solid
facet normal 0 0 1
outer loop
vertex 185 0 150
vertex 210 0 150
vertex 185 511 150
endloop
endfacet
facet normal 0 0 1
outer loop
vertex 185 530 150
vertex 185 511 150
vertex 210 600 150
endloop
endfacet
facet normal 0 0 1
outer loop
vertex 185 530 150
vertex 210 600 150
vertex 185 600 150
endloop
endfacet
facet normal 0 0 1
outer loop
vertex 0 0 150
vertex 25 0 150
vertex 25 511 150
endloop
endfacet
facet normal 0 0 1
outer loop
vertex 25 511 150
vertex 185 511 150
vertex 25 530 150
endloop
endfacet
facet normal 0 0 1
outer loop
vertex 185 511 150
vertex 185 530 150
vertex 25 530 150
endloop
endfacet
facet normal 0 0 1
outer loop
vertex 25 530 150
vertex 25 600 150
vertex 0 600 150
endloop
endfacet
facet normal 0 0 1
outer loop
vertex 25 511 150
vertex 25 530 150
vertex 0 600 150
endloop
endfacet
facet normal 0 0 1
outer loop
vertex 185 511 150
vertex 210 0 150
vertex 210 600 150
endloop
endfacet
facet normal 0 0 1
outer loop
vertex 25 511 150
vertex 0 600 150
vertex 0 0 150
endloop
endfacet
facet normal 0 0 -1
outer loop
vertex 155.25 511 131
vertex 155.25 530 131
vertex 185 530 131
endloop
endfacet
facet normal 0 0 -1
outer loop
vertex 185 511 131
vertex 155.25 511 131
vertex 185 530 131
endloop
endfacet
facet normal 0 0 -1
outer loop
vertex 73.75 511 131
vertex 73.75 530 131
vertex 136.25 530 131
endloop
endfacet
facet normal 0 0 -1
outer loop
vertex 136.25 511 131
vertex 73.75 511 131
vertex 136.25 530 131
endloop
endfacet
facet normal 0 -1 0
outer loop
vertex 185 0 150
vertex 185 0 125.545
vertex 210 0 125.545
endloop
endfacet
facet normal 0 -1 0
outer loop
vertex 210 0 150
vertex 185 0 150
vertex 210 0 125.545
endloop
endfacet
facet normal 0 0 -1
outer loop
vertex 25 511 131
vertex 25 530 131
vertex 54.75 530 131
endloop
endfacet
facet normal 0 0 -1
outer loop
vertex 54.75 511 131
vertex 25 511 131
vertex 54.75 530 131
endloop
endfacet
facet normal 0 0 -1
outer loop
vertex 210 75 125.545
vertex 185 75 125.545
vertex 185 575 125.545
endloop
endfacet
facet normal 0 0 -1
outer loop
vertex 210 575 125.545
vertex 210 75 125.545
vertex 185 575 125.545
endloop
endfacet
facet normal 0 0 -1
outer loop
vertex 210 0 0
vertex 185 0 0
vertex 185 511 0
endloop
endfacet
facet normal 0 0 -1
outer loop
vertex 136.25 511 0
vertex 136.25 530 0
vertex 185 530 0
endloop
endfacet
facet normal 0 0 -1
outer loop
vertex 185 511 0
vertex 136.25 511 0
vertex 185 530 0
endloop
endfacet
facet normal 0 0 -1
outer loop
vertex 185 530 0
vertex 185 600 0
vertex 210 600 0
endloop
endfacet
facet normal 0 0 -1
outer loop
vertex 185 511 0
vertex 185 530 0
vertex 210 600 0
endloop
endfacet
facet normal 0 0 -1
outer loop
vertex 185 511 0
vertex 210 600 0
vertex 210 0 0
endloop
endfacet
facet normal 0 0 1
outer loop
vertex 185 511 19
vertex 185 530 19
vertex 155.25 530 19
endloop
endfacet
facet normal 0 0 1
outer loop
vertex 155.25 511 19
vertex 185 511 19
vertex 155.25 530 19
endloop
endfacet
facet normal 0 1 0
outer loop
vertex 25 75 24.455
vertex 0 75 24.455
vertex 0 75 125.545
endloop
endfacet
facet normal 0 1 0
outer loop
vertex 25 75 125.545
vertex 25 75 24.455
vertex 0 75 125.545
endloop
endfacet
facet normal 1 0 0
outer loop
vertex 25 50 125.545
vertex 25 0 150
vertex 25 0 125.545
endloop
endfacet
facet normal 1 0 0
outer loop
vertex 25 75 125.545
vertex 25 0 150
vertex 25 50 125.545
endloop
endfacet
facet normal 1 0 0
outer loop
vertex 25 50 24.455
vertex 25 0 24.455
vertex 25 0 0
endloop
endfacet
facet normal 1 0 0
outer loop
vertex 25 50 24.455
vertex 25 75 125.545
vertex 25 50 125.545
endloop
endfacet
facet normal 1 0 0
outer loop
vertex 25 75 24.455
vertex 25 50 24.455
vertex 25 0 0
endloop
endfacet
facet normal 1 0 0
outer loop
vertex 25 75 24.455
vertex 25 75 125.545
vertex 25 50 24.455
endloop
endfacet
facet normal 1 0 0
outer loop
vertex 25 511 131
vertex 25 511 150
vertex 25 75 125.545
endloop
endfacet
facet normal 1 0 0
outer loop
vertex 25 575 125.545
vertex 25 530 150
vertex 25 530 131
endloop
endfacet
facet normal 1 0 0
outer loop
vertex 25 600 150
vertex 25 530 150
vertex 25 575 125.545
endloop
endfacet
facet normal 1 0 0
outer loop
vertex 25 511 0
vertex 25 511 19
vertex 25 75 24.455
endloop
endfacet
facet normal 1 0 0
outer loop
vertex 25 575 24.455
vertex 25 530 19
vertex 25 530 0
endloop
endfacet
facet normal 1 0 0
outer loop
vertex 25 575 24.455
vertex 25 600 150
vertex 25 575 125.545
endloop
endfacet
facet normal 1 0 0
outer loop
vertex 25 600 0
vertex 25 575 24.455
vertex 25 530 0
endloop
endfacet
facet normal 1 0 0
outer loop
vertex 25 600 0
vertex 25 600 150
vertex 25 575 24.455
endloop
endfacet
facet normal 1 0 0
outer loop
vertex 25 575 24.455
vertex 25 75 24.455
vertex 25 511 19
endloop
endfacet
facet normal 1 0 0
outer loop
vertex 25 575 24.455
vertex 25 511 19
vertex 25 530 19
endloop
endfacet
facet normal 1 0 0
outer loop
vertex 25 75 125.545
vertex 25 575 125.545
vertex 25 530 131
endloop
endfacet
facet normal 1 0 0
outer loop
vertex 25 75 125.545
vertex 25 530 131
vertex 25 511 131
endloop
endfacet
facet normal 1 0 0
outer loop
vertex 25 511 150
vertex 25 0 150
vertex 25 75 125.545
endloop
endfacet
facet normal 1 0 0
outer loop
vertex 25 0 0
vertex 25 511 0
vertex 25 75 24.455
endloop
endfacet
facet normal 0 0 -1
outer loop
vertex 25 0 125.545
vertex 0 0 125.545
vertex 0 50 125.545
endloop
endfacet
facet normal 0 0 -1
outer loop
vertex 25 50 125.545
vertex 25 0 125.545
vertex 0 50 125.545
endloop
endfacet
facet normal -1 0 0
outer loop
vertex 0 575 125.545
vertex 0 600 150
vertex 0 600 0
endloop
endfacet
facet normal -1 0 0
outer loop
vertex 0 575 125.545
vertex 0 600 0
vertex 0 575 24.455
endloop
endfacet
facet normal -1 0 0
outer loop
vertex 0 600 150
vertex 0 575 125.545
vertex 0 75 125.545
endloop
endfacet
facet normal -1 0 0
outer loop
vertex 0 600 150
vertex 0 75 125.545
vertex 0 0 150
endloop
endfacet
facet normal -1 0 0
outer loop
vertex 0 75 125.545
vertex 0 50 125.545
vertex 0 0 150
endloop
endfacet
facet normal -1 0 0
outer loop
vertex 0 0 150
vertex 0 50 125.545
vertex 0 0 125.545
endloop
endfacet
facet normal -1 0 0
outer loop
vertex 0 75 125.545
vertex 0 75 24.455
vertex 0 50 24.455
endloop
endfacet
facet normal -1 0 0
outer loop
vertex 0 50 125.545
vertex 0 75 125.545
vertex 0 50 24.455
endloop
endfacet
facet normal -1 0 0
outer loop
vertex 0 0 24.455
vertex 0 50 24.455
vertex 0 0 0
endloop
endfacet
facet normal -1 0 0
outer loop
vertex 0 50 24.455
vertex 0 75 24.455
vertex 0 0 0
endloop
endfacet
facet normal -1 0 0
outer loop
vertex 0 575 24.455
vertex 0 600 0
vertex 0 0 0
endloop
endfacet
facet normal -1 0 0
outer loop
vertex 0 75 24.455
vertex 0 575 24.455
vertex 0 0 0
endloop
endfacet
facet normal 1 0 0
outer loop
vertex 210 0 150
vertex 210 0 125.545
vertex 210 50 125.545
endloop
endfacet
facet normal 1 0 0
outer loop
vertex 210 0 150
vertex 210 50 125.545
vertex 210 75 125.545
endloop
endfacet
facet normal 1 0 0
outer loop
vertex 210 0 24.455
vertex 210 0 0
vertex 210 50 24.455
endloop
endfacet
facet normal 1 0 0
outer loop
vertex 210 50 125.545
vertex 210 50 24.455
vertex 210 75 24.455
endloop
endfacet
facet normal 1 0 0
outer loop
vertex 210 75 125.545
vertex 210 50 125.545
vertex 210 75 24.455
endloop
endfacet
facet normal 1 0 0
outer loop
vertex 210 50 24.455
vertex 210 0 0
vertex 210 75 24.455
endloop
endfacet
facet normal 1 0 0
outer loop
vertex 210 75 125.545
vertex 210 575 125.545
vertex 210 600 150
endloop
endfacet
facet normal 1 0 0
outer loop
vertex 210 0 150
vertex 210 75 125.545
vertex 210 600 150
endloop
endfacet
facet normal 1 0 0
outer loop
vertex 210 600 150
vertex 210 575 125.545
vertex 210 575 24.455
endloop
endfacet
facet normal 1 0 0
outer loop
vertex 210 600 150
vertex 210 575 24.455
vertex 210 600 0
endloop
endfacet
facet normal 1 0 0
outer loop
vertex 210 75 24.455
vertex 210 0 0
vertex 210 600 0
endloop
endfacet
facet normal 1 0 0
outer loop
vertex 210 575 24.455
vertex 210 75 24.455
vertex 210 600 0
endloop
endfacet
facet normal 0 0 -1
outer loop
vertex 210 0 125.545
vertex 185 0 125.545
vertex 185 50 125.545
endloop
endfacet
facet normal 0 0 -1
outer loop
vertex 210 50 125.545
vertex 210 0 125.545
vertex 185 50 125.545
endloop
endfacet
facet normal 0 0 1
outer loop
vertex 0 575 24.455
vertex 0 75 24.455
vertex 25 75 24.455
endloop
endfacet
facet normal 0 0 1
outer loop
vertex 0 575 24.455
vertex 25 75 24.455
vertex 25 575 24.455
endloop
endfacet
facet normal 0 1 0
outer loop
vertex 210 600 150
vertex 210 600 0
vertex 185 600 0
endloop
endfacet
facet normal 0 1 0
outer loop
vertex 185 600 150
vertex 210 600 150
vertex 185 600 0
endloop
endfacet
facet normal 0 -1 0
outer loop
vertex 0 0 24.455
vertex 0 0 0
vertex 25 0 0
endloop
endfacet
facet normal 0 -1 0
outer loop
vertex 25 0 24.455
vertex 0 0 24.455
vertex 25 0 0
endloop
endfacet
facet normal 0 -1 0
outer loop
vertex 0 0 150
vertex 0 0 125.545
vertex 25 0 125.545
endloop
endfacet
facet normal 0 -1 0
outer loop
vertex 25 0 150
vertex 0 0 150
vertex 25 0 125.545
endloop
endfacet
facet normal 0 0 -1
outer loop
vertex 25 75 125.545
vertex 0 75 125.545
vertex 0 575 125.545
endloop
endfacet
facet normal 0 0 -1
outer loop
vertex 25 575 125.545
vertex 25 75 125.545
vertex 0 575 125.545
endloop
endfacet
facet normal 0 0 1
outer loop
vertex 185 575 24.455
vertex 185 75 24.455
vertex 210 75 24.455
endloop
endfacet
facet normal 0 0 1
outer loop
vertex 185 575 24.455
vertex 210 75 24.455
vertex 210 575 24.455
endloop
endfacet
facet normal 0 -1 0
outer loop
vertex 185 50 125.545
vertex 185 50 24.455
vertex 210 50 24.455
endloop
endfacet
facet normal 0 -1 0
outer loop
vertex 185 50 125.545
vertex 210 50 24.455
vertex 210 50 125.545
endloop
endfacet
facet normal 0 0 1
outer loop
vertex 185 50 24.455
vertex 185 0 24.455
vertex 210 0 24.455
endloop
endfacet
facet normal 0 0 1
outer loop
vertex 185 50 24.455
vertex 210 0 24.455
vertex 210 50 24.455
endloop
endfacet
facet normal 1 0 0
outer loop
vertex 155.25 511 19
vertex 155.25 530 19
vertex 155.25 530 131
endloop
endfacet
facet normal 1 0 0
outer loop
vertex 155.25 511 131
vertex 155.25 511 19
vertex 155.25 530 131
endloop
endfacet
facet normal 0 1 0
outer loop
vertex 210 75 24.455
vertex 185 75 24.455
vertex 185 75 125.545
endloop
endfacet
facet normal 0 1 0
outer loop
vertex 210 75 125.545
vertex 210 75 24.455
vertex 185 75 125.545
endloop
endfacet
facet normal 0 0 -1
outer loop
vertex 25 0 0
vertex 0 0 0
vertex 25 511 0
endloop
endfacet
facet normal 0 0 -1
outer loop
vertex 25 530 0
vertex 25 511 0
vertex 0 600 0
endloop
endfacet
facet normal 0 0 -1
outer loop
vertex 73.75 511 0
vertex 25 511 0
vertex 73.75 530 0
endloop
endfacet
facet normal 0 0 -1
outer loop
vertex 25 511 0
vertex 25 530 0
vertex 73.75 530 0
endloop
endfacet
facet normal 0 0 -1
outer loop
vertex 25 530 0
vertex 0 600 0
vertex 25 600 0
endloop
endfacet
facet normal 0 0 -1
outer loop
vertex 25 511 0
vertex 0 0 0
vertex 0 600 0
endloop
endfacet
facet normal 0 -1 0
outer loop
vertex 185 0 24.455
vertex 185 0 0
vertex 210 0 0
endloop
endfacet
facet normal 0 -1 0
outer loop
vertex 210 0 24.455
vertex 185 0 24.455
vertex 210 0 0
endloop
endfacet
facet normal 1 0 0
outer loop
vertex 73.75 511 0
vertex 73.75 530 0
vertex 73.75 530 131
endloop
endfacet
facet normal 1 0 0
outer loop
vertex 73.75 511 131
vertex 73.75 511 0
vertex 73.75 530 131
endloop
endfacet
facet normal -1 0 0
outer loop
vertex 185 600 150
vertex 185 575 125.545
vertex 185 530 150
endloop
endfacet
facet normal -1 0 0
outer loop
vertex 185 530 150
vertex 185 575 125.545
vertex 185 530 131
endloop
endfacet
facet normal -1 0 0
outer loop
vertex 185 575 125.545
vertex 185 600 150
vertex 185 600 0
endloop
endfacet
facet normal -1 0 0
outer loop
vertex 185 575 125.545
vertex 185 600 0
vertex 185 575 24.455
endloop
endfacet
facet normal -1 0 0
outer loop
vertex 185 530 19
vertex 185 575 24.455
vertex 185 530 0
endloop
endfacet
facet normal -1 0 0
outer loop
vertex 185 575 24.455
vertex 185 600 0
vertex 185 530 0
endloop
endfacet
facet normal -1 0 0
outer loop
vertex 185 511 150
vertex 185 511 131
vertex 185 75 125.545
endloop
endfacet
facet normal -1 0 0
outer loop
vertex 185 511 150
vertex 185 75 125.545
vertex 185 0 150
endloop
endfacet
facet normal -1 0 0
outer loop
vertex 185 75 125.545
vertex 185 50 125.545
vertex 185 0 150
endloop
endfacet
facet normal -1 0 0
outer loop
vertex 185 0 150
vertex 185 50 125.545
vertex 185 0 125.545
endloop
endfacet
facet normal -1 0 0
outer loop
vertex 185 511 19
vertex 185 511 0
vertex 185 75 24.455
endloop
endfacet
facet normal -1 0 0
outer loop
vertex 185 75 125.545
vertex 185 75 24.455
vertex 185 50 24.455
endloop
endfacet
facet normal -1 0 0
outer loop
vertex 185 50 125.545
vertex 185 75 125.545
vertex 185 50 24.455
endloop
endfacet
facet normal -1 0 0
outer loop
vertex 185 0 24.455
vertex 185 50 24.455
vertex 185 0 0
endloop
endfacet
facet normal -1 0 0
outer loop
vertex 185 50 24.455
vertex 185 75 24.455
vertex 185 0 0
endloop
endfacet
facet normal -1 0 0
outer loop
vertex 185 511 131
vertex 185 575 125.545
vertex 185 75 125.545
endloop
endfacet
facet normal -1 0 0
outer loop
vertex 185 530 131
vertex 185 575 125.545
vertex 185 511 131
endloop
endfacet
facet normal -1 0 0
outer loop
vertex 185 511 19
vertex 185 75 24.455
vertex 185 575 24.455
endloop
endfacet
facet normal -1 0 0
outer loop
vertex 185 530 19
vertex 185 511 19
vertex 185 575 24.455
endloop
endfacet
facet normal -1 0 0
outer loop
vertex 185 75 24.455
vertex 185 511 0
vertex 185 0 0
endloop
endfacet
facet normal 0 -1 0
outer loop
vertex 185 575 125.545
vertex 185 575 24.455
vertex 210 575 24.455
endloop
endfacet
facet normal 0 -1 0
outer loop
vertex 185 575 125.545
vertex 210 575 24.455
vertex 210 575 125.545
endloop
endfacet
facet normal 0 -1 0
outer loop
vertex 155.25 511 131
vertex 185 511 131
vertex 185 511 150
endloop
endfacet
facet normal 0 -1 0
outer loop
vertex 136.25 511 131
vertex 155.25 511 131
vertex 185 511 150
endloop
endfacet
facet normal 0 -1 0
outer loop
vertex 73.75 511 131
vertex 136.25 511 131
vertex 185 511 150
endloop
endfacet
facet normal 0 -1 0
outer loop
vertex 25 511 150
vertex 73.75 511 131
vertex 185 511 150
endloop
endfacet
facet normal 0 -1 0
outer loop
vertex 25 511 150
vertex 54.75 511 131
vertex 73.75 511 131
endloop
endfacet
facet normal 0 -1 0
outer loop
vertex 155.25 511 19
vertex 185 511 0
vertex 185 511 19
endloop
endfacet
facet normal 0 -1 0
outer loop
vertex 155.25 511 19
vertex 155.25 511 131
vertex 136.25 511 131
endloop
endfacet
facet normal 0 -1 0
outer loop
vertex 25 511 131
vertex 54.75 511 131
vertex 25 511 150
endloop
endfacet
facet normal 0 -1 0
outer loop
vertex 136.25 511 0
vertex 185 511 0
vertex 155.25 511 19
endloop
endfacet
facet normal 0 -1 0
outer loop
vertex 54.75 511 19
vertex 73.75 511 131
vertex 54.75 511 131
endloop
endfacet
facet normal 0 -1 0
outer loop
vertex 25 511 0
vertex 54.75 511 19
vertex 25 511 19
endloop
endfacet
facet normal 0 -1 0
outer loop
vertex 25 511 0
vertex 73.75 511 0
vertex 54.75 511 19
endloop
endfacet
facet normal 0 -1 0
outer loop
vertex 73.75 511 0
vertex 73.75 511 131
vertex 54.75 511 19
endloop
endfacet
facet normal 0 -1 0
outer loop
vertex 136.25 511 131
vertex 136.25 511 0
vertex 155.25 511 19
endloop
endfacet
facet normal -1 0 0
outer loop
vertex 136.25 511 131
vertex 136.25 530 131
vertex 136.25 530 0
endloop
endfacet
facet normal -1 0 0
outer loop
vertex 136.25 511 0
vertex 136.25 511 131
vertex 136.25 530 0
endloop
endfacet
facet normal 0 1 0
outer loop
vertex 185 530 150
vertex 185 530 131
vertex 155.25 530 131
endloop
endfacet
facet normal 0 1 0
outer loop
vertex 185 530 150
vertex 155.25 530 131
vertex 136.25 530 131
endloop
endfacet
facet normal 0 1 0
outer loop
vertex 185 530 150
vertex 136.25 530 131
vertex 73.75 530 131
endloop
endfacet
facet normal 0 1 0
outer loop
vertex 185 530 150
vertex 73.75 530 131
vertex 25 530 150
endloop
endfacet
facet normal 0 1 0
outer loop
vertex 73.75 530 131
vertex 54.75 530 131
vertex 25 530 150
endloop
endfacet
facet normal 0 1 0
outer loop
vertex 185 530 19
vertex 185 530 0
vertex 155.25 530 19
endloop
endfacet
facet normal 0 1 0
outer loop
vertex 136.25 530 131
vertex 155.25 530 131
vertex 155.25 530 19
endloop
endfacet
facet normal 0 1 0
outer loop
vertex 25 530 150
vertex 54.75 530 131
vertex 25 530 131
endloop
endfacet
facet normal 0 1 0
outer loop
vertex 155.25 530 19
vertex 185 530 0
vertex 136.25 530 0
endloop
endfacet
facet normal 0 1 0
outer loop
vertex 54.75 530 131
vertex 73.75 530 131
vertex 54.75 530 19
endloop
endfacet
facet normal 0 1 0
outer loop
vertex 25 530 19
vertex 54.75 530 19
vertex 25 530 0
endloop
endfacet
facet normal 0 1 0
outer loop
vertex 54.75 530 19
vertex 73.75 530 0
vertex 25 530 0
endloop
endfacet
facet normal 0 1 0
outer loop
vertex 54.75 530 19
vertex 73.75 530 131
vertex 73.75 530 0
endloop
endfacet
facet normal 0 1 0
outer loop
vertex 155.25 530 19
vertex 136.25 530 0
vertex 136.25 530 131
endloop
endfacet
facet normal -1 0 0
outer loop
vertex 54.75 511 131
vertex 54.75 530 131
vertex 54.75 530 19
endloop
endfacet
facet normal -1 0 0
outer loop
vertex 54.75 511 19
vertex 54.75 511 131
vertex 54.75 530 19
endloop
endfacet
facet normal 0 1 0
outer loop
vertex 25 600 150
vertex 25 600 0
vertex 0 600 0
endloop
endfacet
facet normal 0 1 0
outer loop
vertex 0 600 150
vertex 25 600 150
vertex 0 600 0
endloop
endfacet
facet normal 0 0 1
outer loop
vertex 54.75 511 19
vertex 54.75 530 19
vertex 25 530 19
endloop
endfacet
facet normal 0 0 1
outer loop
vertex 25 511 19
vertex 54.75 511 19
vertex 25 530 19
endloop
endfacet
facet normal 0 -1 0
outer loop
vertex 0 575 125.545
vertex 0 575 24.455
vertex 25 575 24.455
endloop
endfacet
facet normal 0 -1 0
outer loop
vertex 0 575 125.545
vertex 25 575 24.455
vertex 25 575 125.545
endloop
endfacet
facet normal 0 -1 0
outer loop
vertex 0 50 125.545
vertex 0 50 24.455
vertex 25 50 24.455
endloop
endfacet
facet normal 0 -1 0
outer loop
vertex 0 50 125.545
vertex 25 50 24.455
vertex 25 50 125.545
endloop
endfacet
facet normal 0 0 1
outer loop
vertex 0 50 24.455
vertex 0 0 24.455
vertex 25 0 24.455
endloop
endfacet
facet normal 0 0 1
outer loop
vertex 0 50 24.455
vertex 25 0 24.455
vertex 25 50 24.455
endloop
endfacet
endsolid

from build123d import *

# Parameters (mm, degrees)
BOSS_EXTRUDE5_DEPTH = 150
SKETCH6_W           = 101.090693468
SKETCH6_H           = 50
SKETCH6_H_2         = 500
CUT_EXTRUDE1_DEPTH  = 654.146231712
CUT_EXTRUDE2_REACH  = 655.146
SKETCH7_W           = 160
SKETCH7_H           = 150
SKETCH8_W           = 48.75
SKETCH8_H           = 19
BOSS_EXTRUDE6_DEPTH = 19
BOSS_EXTRUDE8_DEPTH = 19


with BuildPart() as part:
    # Sketch5 → Boss-Extrude5 (new body)
    with BuildSketch(Plane.XY):
        Polygon((0, 600), (0, 0), (25, 0), (25, 575), (185, 575), (185, 0), (210, 0), (210, 600), align=None)
    extrude(amount=BOSS_EXTRUDE5_DEPTH)

    # Sketch6 → Cut-Extrude1 (cut, through all)
    with BuildSketch(Plane.ZY):
        with Locations((75, 25)):
            Rectangle(SKETCH6_W, SKETCH6_H)
        with Locations((75, 325)):
            Rectangle(SKETCH6_W, SKETCH6_H_2)
    extrude(amount=-CUT_EXTRUDE1_DEPTH, mode=Mode.SUBTRACT)

    # Sketch7 → Cut-Extrude2 (cut, up to next)
    with BuildSketch(Plane(origin=(0, 600, 0), x_dir=(1, 0, 0), z_dir=(0, 1, 0)), mode=Mode.PRIVATE) as cut_extrude2_sk1:
        with Locations((105, -75)):
            Rectangle(SKETCH7_W, SKETCH7_H)
    cut_extrude2_tool1 = extrude(cut_extrude2_sk1.sketch, amount=-CUT_EXTRUDE2_REACH, mode=Mode.PRIVATE) & part.part
    add(cut_extrude2_tool1.solids().sort_by_distance((105, 600, 75))[0], mode=Mode.SUBTRACT)


with BuildPart() as cut_extrude2_piece_1:
    # of the separate pieces the step leaves, piece 1, a body of its own (cut_extrude2_pieces)
    add(part.part.solids().sort_by_distance((0, 600, 0))[0])

    # Sketch8 → Boss-Extrude6 (add)
    with BuildSketch(Plane(origin=(0, 0, 0), x_dir=(-1, 0, 0), z_dir=(0, 0, -1))):
        with Locations((-160.625, 520.5)):
            Rectangle(SKETCH8_W, SKETCH8_H)
        with Locations((-49.375, 520.5)):
            Rectangle(SKETCH8_W, SKETCH8_H)
    extrude(amount=-BOSS_EXTRUDE6_DEPTH)


with BuildPart() as cut_extrude2_piece_2:
    # of the separate pieces the step leaves, piece 2, a body of its own (cut_extrude2_pieces)
    add(part.part.solids().sort_by_distance((210, 600, 0))[0])



with BuildPart() as boss_extrude6_piece_1:
    # of the separate pieces the step leaves, piece 1, a body of its own (boss_extrude6_pieces)
    add(cut_extrude2_piece_1.part.solids().sort_by_distance((0, 600, 0))[0])


with BuildPart() as boss_extrude6_piece_2:
    # of the separate pieces the step leaves, piece 2, a body of its own (boss_extrude6_pieces)
    add(cut_extrude2_piece_1.part.solids().sort_by_distance((136.25, 530, 0))[0])


with BuildPart() as cut_extrude2_piece_2_1:
    add(cut_extrude2_piece_2.part)

    add(boss_extrude6_piece_1.part)  # Boss-Extrude8 merges Boss-Extrude6 piece 1

    add(boss_extrude6_piece_2.part)  # Boss-Extrude8 merges Boss-Extrude6 piece 2
    # Sketch10 → Boss-Extrude8 (add)
    with BuildSketch(Plane(origin=(0, 530, 0), x_dir=(1, 0, 0), z_dir=(0, 1, 0))):
        Polygon((185, -150), (25, -150), (25, -131), (54.75, -131), (54.75, -19), (73.75, -19), (73.75, -131), (136.25, -131), (136.25, -19), (155.25, -19), (155.25, -131), (185, -131), align=None)
    extrude(amount=-BOSS_EXTRUDE8_DEPTH)


solid = cut_extrude2_piece_2_1.part
